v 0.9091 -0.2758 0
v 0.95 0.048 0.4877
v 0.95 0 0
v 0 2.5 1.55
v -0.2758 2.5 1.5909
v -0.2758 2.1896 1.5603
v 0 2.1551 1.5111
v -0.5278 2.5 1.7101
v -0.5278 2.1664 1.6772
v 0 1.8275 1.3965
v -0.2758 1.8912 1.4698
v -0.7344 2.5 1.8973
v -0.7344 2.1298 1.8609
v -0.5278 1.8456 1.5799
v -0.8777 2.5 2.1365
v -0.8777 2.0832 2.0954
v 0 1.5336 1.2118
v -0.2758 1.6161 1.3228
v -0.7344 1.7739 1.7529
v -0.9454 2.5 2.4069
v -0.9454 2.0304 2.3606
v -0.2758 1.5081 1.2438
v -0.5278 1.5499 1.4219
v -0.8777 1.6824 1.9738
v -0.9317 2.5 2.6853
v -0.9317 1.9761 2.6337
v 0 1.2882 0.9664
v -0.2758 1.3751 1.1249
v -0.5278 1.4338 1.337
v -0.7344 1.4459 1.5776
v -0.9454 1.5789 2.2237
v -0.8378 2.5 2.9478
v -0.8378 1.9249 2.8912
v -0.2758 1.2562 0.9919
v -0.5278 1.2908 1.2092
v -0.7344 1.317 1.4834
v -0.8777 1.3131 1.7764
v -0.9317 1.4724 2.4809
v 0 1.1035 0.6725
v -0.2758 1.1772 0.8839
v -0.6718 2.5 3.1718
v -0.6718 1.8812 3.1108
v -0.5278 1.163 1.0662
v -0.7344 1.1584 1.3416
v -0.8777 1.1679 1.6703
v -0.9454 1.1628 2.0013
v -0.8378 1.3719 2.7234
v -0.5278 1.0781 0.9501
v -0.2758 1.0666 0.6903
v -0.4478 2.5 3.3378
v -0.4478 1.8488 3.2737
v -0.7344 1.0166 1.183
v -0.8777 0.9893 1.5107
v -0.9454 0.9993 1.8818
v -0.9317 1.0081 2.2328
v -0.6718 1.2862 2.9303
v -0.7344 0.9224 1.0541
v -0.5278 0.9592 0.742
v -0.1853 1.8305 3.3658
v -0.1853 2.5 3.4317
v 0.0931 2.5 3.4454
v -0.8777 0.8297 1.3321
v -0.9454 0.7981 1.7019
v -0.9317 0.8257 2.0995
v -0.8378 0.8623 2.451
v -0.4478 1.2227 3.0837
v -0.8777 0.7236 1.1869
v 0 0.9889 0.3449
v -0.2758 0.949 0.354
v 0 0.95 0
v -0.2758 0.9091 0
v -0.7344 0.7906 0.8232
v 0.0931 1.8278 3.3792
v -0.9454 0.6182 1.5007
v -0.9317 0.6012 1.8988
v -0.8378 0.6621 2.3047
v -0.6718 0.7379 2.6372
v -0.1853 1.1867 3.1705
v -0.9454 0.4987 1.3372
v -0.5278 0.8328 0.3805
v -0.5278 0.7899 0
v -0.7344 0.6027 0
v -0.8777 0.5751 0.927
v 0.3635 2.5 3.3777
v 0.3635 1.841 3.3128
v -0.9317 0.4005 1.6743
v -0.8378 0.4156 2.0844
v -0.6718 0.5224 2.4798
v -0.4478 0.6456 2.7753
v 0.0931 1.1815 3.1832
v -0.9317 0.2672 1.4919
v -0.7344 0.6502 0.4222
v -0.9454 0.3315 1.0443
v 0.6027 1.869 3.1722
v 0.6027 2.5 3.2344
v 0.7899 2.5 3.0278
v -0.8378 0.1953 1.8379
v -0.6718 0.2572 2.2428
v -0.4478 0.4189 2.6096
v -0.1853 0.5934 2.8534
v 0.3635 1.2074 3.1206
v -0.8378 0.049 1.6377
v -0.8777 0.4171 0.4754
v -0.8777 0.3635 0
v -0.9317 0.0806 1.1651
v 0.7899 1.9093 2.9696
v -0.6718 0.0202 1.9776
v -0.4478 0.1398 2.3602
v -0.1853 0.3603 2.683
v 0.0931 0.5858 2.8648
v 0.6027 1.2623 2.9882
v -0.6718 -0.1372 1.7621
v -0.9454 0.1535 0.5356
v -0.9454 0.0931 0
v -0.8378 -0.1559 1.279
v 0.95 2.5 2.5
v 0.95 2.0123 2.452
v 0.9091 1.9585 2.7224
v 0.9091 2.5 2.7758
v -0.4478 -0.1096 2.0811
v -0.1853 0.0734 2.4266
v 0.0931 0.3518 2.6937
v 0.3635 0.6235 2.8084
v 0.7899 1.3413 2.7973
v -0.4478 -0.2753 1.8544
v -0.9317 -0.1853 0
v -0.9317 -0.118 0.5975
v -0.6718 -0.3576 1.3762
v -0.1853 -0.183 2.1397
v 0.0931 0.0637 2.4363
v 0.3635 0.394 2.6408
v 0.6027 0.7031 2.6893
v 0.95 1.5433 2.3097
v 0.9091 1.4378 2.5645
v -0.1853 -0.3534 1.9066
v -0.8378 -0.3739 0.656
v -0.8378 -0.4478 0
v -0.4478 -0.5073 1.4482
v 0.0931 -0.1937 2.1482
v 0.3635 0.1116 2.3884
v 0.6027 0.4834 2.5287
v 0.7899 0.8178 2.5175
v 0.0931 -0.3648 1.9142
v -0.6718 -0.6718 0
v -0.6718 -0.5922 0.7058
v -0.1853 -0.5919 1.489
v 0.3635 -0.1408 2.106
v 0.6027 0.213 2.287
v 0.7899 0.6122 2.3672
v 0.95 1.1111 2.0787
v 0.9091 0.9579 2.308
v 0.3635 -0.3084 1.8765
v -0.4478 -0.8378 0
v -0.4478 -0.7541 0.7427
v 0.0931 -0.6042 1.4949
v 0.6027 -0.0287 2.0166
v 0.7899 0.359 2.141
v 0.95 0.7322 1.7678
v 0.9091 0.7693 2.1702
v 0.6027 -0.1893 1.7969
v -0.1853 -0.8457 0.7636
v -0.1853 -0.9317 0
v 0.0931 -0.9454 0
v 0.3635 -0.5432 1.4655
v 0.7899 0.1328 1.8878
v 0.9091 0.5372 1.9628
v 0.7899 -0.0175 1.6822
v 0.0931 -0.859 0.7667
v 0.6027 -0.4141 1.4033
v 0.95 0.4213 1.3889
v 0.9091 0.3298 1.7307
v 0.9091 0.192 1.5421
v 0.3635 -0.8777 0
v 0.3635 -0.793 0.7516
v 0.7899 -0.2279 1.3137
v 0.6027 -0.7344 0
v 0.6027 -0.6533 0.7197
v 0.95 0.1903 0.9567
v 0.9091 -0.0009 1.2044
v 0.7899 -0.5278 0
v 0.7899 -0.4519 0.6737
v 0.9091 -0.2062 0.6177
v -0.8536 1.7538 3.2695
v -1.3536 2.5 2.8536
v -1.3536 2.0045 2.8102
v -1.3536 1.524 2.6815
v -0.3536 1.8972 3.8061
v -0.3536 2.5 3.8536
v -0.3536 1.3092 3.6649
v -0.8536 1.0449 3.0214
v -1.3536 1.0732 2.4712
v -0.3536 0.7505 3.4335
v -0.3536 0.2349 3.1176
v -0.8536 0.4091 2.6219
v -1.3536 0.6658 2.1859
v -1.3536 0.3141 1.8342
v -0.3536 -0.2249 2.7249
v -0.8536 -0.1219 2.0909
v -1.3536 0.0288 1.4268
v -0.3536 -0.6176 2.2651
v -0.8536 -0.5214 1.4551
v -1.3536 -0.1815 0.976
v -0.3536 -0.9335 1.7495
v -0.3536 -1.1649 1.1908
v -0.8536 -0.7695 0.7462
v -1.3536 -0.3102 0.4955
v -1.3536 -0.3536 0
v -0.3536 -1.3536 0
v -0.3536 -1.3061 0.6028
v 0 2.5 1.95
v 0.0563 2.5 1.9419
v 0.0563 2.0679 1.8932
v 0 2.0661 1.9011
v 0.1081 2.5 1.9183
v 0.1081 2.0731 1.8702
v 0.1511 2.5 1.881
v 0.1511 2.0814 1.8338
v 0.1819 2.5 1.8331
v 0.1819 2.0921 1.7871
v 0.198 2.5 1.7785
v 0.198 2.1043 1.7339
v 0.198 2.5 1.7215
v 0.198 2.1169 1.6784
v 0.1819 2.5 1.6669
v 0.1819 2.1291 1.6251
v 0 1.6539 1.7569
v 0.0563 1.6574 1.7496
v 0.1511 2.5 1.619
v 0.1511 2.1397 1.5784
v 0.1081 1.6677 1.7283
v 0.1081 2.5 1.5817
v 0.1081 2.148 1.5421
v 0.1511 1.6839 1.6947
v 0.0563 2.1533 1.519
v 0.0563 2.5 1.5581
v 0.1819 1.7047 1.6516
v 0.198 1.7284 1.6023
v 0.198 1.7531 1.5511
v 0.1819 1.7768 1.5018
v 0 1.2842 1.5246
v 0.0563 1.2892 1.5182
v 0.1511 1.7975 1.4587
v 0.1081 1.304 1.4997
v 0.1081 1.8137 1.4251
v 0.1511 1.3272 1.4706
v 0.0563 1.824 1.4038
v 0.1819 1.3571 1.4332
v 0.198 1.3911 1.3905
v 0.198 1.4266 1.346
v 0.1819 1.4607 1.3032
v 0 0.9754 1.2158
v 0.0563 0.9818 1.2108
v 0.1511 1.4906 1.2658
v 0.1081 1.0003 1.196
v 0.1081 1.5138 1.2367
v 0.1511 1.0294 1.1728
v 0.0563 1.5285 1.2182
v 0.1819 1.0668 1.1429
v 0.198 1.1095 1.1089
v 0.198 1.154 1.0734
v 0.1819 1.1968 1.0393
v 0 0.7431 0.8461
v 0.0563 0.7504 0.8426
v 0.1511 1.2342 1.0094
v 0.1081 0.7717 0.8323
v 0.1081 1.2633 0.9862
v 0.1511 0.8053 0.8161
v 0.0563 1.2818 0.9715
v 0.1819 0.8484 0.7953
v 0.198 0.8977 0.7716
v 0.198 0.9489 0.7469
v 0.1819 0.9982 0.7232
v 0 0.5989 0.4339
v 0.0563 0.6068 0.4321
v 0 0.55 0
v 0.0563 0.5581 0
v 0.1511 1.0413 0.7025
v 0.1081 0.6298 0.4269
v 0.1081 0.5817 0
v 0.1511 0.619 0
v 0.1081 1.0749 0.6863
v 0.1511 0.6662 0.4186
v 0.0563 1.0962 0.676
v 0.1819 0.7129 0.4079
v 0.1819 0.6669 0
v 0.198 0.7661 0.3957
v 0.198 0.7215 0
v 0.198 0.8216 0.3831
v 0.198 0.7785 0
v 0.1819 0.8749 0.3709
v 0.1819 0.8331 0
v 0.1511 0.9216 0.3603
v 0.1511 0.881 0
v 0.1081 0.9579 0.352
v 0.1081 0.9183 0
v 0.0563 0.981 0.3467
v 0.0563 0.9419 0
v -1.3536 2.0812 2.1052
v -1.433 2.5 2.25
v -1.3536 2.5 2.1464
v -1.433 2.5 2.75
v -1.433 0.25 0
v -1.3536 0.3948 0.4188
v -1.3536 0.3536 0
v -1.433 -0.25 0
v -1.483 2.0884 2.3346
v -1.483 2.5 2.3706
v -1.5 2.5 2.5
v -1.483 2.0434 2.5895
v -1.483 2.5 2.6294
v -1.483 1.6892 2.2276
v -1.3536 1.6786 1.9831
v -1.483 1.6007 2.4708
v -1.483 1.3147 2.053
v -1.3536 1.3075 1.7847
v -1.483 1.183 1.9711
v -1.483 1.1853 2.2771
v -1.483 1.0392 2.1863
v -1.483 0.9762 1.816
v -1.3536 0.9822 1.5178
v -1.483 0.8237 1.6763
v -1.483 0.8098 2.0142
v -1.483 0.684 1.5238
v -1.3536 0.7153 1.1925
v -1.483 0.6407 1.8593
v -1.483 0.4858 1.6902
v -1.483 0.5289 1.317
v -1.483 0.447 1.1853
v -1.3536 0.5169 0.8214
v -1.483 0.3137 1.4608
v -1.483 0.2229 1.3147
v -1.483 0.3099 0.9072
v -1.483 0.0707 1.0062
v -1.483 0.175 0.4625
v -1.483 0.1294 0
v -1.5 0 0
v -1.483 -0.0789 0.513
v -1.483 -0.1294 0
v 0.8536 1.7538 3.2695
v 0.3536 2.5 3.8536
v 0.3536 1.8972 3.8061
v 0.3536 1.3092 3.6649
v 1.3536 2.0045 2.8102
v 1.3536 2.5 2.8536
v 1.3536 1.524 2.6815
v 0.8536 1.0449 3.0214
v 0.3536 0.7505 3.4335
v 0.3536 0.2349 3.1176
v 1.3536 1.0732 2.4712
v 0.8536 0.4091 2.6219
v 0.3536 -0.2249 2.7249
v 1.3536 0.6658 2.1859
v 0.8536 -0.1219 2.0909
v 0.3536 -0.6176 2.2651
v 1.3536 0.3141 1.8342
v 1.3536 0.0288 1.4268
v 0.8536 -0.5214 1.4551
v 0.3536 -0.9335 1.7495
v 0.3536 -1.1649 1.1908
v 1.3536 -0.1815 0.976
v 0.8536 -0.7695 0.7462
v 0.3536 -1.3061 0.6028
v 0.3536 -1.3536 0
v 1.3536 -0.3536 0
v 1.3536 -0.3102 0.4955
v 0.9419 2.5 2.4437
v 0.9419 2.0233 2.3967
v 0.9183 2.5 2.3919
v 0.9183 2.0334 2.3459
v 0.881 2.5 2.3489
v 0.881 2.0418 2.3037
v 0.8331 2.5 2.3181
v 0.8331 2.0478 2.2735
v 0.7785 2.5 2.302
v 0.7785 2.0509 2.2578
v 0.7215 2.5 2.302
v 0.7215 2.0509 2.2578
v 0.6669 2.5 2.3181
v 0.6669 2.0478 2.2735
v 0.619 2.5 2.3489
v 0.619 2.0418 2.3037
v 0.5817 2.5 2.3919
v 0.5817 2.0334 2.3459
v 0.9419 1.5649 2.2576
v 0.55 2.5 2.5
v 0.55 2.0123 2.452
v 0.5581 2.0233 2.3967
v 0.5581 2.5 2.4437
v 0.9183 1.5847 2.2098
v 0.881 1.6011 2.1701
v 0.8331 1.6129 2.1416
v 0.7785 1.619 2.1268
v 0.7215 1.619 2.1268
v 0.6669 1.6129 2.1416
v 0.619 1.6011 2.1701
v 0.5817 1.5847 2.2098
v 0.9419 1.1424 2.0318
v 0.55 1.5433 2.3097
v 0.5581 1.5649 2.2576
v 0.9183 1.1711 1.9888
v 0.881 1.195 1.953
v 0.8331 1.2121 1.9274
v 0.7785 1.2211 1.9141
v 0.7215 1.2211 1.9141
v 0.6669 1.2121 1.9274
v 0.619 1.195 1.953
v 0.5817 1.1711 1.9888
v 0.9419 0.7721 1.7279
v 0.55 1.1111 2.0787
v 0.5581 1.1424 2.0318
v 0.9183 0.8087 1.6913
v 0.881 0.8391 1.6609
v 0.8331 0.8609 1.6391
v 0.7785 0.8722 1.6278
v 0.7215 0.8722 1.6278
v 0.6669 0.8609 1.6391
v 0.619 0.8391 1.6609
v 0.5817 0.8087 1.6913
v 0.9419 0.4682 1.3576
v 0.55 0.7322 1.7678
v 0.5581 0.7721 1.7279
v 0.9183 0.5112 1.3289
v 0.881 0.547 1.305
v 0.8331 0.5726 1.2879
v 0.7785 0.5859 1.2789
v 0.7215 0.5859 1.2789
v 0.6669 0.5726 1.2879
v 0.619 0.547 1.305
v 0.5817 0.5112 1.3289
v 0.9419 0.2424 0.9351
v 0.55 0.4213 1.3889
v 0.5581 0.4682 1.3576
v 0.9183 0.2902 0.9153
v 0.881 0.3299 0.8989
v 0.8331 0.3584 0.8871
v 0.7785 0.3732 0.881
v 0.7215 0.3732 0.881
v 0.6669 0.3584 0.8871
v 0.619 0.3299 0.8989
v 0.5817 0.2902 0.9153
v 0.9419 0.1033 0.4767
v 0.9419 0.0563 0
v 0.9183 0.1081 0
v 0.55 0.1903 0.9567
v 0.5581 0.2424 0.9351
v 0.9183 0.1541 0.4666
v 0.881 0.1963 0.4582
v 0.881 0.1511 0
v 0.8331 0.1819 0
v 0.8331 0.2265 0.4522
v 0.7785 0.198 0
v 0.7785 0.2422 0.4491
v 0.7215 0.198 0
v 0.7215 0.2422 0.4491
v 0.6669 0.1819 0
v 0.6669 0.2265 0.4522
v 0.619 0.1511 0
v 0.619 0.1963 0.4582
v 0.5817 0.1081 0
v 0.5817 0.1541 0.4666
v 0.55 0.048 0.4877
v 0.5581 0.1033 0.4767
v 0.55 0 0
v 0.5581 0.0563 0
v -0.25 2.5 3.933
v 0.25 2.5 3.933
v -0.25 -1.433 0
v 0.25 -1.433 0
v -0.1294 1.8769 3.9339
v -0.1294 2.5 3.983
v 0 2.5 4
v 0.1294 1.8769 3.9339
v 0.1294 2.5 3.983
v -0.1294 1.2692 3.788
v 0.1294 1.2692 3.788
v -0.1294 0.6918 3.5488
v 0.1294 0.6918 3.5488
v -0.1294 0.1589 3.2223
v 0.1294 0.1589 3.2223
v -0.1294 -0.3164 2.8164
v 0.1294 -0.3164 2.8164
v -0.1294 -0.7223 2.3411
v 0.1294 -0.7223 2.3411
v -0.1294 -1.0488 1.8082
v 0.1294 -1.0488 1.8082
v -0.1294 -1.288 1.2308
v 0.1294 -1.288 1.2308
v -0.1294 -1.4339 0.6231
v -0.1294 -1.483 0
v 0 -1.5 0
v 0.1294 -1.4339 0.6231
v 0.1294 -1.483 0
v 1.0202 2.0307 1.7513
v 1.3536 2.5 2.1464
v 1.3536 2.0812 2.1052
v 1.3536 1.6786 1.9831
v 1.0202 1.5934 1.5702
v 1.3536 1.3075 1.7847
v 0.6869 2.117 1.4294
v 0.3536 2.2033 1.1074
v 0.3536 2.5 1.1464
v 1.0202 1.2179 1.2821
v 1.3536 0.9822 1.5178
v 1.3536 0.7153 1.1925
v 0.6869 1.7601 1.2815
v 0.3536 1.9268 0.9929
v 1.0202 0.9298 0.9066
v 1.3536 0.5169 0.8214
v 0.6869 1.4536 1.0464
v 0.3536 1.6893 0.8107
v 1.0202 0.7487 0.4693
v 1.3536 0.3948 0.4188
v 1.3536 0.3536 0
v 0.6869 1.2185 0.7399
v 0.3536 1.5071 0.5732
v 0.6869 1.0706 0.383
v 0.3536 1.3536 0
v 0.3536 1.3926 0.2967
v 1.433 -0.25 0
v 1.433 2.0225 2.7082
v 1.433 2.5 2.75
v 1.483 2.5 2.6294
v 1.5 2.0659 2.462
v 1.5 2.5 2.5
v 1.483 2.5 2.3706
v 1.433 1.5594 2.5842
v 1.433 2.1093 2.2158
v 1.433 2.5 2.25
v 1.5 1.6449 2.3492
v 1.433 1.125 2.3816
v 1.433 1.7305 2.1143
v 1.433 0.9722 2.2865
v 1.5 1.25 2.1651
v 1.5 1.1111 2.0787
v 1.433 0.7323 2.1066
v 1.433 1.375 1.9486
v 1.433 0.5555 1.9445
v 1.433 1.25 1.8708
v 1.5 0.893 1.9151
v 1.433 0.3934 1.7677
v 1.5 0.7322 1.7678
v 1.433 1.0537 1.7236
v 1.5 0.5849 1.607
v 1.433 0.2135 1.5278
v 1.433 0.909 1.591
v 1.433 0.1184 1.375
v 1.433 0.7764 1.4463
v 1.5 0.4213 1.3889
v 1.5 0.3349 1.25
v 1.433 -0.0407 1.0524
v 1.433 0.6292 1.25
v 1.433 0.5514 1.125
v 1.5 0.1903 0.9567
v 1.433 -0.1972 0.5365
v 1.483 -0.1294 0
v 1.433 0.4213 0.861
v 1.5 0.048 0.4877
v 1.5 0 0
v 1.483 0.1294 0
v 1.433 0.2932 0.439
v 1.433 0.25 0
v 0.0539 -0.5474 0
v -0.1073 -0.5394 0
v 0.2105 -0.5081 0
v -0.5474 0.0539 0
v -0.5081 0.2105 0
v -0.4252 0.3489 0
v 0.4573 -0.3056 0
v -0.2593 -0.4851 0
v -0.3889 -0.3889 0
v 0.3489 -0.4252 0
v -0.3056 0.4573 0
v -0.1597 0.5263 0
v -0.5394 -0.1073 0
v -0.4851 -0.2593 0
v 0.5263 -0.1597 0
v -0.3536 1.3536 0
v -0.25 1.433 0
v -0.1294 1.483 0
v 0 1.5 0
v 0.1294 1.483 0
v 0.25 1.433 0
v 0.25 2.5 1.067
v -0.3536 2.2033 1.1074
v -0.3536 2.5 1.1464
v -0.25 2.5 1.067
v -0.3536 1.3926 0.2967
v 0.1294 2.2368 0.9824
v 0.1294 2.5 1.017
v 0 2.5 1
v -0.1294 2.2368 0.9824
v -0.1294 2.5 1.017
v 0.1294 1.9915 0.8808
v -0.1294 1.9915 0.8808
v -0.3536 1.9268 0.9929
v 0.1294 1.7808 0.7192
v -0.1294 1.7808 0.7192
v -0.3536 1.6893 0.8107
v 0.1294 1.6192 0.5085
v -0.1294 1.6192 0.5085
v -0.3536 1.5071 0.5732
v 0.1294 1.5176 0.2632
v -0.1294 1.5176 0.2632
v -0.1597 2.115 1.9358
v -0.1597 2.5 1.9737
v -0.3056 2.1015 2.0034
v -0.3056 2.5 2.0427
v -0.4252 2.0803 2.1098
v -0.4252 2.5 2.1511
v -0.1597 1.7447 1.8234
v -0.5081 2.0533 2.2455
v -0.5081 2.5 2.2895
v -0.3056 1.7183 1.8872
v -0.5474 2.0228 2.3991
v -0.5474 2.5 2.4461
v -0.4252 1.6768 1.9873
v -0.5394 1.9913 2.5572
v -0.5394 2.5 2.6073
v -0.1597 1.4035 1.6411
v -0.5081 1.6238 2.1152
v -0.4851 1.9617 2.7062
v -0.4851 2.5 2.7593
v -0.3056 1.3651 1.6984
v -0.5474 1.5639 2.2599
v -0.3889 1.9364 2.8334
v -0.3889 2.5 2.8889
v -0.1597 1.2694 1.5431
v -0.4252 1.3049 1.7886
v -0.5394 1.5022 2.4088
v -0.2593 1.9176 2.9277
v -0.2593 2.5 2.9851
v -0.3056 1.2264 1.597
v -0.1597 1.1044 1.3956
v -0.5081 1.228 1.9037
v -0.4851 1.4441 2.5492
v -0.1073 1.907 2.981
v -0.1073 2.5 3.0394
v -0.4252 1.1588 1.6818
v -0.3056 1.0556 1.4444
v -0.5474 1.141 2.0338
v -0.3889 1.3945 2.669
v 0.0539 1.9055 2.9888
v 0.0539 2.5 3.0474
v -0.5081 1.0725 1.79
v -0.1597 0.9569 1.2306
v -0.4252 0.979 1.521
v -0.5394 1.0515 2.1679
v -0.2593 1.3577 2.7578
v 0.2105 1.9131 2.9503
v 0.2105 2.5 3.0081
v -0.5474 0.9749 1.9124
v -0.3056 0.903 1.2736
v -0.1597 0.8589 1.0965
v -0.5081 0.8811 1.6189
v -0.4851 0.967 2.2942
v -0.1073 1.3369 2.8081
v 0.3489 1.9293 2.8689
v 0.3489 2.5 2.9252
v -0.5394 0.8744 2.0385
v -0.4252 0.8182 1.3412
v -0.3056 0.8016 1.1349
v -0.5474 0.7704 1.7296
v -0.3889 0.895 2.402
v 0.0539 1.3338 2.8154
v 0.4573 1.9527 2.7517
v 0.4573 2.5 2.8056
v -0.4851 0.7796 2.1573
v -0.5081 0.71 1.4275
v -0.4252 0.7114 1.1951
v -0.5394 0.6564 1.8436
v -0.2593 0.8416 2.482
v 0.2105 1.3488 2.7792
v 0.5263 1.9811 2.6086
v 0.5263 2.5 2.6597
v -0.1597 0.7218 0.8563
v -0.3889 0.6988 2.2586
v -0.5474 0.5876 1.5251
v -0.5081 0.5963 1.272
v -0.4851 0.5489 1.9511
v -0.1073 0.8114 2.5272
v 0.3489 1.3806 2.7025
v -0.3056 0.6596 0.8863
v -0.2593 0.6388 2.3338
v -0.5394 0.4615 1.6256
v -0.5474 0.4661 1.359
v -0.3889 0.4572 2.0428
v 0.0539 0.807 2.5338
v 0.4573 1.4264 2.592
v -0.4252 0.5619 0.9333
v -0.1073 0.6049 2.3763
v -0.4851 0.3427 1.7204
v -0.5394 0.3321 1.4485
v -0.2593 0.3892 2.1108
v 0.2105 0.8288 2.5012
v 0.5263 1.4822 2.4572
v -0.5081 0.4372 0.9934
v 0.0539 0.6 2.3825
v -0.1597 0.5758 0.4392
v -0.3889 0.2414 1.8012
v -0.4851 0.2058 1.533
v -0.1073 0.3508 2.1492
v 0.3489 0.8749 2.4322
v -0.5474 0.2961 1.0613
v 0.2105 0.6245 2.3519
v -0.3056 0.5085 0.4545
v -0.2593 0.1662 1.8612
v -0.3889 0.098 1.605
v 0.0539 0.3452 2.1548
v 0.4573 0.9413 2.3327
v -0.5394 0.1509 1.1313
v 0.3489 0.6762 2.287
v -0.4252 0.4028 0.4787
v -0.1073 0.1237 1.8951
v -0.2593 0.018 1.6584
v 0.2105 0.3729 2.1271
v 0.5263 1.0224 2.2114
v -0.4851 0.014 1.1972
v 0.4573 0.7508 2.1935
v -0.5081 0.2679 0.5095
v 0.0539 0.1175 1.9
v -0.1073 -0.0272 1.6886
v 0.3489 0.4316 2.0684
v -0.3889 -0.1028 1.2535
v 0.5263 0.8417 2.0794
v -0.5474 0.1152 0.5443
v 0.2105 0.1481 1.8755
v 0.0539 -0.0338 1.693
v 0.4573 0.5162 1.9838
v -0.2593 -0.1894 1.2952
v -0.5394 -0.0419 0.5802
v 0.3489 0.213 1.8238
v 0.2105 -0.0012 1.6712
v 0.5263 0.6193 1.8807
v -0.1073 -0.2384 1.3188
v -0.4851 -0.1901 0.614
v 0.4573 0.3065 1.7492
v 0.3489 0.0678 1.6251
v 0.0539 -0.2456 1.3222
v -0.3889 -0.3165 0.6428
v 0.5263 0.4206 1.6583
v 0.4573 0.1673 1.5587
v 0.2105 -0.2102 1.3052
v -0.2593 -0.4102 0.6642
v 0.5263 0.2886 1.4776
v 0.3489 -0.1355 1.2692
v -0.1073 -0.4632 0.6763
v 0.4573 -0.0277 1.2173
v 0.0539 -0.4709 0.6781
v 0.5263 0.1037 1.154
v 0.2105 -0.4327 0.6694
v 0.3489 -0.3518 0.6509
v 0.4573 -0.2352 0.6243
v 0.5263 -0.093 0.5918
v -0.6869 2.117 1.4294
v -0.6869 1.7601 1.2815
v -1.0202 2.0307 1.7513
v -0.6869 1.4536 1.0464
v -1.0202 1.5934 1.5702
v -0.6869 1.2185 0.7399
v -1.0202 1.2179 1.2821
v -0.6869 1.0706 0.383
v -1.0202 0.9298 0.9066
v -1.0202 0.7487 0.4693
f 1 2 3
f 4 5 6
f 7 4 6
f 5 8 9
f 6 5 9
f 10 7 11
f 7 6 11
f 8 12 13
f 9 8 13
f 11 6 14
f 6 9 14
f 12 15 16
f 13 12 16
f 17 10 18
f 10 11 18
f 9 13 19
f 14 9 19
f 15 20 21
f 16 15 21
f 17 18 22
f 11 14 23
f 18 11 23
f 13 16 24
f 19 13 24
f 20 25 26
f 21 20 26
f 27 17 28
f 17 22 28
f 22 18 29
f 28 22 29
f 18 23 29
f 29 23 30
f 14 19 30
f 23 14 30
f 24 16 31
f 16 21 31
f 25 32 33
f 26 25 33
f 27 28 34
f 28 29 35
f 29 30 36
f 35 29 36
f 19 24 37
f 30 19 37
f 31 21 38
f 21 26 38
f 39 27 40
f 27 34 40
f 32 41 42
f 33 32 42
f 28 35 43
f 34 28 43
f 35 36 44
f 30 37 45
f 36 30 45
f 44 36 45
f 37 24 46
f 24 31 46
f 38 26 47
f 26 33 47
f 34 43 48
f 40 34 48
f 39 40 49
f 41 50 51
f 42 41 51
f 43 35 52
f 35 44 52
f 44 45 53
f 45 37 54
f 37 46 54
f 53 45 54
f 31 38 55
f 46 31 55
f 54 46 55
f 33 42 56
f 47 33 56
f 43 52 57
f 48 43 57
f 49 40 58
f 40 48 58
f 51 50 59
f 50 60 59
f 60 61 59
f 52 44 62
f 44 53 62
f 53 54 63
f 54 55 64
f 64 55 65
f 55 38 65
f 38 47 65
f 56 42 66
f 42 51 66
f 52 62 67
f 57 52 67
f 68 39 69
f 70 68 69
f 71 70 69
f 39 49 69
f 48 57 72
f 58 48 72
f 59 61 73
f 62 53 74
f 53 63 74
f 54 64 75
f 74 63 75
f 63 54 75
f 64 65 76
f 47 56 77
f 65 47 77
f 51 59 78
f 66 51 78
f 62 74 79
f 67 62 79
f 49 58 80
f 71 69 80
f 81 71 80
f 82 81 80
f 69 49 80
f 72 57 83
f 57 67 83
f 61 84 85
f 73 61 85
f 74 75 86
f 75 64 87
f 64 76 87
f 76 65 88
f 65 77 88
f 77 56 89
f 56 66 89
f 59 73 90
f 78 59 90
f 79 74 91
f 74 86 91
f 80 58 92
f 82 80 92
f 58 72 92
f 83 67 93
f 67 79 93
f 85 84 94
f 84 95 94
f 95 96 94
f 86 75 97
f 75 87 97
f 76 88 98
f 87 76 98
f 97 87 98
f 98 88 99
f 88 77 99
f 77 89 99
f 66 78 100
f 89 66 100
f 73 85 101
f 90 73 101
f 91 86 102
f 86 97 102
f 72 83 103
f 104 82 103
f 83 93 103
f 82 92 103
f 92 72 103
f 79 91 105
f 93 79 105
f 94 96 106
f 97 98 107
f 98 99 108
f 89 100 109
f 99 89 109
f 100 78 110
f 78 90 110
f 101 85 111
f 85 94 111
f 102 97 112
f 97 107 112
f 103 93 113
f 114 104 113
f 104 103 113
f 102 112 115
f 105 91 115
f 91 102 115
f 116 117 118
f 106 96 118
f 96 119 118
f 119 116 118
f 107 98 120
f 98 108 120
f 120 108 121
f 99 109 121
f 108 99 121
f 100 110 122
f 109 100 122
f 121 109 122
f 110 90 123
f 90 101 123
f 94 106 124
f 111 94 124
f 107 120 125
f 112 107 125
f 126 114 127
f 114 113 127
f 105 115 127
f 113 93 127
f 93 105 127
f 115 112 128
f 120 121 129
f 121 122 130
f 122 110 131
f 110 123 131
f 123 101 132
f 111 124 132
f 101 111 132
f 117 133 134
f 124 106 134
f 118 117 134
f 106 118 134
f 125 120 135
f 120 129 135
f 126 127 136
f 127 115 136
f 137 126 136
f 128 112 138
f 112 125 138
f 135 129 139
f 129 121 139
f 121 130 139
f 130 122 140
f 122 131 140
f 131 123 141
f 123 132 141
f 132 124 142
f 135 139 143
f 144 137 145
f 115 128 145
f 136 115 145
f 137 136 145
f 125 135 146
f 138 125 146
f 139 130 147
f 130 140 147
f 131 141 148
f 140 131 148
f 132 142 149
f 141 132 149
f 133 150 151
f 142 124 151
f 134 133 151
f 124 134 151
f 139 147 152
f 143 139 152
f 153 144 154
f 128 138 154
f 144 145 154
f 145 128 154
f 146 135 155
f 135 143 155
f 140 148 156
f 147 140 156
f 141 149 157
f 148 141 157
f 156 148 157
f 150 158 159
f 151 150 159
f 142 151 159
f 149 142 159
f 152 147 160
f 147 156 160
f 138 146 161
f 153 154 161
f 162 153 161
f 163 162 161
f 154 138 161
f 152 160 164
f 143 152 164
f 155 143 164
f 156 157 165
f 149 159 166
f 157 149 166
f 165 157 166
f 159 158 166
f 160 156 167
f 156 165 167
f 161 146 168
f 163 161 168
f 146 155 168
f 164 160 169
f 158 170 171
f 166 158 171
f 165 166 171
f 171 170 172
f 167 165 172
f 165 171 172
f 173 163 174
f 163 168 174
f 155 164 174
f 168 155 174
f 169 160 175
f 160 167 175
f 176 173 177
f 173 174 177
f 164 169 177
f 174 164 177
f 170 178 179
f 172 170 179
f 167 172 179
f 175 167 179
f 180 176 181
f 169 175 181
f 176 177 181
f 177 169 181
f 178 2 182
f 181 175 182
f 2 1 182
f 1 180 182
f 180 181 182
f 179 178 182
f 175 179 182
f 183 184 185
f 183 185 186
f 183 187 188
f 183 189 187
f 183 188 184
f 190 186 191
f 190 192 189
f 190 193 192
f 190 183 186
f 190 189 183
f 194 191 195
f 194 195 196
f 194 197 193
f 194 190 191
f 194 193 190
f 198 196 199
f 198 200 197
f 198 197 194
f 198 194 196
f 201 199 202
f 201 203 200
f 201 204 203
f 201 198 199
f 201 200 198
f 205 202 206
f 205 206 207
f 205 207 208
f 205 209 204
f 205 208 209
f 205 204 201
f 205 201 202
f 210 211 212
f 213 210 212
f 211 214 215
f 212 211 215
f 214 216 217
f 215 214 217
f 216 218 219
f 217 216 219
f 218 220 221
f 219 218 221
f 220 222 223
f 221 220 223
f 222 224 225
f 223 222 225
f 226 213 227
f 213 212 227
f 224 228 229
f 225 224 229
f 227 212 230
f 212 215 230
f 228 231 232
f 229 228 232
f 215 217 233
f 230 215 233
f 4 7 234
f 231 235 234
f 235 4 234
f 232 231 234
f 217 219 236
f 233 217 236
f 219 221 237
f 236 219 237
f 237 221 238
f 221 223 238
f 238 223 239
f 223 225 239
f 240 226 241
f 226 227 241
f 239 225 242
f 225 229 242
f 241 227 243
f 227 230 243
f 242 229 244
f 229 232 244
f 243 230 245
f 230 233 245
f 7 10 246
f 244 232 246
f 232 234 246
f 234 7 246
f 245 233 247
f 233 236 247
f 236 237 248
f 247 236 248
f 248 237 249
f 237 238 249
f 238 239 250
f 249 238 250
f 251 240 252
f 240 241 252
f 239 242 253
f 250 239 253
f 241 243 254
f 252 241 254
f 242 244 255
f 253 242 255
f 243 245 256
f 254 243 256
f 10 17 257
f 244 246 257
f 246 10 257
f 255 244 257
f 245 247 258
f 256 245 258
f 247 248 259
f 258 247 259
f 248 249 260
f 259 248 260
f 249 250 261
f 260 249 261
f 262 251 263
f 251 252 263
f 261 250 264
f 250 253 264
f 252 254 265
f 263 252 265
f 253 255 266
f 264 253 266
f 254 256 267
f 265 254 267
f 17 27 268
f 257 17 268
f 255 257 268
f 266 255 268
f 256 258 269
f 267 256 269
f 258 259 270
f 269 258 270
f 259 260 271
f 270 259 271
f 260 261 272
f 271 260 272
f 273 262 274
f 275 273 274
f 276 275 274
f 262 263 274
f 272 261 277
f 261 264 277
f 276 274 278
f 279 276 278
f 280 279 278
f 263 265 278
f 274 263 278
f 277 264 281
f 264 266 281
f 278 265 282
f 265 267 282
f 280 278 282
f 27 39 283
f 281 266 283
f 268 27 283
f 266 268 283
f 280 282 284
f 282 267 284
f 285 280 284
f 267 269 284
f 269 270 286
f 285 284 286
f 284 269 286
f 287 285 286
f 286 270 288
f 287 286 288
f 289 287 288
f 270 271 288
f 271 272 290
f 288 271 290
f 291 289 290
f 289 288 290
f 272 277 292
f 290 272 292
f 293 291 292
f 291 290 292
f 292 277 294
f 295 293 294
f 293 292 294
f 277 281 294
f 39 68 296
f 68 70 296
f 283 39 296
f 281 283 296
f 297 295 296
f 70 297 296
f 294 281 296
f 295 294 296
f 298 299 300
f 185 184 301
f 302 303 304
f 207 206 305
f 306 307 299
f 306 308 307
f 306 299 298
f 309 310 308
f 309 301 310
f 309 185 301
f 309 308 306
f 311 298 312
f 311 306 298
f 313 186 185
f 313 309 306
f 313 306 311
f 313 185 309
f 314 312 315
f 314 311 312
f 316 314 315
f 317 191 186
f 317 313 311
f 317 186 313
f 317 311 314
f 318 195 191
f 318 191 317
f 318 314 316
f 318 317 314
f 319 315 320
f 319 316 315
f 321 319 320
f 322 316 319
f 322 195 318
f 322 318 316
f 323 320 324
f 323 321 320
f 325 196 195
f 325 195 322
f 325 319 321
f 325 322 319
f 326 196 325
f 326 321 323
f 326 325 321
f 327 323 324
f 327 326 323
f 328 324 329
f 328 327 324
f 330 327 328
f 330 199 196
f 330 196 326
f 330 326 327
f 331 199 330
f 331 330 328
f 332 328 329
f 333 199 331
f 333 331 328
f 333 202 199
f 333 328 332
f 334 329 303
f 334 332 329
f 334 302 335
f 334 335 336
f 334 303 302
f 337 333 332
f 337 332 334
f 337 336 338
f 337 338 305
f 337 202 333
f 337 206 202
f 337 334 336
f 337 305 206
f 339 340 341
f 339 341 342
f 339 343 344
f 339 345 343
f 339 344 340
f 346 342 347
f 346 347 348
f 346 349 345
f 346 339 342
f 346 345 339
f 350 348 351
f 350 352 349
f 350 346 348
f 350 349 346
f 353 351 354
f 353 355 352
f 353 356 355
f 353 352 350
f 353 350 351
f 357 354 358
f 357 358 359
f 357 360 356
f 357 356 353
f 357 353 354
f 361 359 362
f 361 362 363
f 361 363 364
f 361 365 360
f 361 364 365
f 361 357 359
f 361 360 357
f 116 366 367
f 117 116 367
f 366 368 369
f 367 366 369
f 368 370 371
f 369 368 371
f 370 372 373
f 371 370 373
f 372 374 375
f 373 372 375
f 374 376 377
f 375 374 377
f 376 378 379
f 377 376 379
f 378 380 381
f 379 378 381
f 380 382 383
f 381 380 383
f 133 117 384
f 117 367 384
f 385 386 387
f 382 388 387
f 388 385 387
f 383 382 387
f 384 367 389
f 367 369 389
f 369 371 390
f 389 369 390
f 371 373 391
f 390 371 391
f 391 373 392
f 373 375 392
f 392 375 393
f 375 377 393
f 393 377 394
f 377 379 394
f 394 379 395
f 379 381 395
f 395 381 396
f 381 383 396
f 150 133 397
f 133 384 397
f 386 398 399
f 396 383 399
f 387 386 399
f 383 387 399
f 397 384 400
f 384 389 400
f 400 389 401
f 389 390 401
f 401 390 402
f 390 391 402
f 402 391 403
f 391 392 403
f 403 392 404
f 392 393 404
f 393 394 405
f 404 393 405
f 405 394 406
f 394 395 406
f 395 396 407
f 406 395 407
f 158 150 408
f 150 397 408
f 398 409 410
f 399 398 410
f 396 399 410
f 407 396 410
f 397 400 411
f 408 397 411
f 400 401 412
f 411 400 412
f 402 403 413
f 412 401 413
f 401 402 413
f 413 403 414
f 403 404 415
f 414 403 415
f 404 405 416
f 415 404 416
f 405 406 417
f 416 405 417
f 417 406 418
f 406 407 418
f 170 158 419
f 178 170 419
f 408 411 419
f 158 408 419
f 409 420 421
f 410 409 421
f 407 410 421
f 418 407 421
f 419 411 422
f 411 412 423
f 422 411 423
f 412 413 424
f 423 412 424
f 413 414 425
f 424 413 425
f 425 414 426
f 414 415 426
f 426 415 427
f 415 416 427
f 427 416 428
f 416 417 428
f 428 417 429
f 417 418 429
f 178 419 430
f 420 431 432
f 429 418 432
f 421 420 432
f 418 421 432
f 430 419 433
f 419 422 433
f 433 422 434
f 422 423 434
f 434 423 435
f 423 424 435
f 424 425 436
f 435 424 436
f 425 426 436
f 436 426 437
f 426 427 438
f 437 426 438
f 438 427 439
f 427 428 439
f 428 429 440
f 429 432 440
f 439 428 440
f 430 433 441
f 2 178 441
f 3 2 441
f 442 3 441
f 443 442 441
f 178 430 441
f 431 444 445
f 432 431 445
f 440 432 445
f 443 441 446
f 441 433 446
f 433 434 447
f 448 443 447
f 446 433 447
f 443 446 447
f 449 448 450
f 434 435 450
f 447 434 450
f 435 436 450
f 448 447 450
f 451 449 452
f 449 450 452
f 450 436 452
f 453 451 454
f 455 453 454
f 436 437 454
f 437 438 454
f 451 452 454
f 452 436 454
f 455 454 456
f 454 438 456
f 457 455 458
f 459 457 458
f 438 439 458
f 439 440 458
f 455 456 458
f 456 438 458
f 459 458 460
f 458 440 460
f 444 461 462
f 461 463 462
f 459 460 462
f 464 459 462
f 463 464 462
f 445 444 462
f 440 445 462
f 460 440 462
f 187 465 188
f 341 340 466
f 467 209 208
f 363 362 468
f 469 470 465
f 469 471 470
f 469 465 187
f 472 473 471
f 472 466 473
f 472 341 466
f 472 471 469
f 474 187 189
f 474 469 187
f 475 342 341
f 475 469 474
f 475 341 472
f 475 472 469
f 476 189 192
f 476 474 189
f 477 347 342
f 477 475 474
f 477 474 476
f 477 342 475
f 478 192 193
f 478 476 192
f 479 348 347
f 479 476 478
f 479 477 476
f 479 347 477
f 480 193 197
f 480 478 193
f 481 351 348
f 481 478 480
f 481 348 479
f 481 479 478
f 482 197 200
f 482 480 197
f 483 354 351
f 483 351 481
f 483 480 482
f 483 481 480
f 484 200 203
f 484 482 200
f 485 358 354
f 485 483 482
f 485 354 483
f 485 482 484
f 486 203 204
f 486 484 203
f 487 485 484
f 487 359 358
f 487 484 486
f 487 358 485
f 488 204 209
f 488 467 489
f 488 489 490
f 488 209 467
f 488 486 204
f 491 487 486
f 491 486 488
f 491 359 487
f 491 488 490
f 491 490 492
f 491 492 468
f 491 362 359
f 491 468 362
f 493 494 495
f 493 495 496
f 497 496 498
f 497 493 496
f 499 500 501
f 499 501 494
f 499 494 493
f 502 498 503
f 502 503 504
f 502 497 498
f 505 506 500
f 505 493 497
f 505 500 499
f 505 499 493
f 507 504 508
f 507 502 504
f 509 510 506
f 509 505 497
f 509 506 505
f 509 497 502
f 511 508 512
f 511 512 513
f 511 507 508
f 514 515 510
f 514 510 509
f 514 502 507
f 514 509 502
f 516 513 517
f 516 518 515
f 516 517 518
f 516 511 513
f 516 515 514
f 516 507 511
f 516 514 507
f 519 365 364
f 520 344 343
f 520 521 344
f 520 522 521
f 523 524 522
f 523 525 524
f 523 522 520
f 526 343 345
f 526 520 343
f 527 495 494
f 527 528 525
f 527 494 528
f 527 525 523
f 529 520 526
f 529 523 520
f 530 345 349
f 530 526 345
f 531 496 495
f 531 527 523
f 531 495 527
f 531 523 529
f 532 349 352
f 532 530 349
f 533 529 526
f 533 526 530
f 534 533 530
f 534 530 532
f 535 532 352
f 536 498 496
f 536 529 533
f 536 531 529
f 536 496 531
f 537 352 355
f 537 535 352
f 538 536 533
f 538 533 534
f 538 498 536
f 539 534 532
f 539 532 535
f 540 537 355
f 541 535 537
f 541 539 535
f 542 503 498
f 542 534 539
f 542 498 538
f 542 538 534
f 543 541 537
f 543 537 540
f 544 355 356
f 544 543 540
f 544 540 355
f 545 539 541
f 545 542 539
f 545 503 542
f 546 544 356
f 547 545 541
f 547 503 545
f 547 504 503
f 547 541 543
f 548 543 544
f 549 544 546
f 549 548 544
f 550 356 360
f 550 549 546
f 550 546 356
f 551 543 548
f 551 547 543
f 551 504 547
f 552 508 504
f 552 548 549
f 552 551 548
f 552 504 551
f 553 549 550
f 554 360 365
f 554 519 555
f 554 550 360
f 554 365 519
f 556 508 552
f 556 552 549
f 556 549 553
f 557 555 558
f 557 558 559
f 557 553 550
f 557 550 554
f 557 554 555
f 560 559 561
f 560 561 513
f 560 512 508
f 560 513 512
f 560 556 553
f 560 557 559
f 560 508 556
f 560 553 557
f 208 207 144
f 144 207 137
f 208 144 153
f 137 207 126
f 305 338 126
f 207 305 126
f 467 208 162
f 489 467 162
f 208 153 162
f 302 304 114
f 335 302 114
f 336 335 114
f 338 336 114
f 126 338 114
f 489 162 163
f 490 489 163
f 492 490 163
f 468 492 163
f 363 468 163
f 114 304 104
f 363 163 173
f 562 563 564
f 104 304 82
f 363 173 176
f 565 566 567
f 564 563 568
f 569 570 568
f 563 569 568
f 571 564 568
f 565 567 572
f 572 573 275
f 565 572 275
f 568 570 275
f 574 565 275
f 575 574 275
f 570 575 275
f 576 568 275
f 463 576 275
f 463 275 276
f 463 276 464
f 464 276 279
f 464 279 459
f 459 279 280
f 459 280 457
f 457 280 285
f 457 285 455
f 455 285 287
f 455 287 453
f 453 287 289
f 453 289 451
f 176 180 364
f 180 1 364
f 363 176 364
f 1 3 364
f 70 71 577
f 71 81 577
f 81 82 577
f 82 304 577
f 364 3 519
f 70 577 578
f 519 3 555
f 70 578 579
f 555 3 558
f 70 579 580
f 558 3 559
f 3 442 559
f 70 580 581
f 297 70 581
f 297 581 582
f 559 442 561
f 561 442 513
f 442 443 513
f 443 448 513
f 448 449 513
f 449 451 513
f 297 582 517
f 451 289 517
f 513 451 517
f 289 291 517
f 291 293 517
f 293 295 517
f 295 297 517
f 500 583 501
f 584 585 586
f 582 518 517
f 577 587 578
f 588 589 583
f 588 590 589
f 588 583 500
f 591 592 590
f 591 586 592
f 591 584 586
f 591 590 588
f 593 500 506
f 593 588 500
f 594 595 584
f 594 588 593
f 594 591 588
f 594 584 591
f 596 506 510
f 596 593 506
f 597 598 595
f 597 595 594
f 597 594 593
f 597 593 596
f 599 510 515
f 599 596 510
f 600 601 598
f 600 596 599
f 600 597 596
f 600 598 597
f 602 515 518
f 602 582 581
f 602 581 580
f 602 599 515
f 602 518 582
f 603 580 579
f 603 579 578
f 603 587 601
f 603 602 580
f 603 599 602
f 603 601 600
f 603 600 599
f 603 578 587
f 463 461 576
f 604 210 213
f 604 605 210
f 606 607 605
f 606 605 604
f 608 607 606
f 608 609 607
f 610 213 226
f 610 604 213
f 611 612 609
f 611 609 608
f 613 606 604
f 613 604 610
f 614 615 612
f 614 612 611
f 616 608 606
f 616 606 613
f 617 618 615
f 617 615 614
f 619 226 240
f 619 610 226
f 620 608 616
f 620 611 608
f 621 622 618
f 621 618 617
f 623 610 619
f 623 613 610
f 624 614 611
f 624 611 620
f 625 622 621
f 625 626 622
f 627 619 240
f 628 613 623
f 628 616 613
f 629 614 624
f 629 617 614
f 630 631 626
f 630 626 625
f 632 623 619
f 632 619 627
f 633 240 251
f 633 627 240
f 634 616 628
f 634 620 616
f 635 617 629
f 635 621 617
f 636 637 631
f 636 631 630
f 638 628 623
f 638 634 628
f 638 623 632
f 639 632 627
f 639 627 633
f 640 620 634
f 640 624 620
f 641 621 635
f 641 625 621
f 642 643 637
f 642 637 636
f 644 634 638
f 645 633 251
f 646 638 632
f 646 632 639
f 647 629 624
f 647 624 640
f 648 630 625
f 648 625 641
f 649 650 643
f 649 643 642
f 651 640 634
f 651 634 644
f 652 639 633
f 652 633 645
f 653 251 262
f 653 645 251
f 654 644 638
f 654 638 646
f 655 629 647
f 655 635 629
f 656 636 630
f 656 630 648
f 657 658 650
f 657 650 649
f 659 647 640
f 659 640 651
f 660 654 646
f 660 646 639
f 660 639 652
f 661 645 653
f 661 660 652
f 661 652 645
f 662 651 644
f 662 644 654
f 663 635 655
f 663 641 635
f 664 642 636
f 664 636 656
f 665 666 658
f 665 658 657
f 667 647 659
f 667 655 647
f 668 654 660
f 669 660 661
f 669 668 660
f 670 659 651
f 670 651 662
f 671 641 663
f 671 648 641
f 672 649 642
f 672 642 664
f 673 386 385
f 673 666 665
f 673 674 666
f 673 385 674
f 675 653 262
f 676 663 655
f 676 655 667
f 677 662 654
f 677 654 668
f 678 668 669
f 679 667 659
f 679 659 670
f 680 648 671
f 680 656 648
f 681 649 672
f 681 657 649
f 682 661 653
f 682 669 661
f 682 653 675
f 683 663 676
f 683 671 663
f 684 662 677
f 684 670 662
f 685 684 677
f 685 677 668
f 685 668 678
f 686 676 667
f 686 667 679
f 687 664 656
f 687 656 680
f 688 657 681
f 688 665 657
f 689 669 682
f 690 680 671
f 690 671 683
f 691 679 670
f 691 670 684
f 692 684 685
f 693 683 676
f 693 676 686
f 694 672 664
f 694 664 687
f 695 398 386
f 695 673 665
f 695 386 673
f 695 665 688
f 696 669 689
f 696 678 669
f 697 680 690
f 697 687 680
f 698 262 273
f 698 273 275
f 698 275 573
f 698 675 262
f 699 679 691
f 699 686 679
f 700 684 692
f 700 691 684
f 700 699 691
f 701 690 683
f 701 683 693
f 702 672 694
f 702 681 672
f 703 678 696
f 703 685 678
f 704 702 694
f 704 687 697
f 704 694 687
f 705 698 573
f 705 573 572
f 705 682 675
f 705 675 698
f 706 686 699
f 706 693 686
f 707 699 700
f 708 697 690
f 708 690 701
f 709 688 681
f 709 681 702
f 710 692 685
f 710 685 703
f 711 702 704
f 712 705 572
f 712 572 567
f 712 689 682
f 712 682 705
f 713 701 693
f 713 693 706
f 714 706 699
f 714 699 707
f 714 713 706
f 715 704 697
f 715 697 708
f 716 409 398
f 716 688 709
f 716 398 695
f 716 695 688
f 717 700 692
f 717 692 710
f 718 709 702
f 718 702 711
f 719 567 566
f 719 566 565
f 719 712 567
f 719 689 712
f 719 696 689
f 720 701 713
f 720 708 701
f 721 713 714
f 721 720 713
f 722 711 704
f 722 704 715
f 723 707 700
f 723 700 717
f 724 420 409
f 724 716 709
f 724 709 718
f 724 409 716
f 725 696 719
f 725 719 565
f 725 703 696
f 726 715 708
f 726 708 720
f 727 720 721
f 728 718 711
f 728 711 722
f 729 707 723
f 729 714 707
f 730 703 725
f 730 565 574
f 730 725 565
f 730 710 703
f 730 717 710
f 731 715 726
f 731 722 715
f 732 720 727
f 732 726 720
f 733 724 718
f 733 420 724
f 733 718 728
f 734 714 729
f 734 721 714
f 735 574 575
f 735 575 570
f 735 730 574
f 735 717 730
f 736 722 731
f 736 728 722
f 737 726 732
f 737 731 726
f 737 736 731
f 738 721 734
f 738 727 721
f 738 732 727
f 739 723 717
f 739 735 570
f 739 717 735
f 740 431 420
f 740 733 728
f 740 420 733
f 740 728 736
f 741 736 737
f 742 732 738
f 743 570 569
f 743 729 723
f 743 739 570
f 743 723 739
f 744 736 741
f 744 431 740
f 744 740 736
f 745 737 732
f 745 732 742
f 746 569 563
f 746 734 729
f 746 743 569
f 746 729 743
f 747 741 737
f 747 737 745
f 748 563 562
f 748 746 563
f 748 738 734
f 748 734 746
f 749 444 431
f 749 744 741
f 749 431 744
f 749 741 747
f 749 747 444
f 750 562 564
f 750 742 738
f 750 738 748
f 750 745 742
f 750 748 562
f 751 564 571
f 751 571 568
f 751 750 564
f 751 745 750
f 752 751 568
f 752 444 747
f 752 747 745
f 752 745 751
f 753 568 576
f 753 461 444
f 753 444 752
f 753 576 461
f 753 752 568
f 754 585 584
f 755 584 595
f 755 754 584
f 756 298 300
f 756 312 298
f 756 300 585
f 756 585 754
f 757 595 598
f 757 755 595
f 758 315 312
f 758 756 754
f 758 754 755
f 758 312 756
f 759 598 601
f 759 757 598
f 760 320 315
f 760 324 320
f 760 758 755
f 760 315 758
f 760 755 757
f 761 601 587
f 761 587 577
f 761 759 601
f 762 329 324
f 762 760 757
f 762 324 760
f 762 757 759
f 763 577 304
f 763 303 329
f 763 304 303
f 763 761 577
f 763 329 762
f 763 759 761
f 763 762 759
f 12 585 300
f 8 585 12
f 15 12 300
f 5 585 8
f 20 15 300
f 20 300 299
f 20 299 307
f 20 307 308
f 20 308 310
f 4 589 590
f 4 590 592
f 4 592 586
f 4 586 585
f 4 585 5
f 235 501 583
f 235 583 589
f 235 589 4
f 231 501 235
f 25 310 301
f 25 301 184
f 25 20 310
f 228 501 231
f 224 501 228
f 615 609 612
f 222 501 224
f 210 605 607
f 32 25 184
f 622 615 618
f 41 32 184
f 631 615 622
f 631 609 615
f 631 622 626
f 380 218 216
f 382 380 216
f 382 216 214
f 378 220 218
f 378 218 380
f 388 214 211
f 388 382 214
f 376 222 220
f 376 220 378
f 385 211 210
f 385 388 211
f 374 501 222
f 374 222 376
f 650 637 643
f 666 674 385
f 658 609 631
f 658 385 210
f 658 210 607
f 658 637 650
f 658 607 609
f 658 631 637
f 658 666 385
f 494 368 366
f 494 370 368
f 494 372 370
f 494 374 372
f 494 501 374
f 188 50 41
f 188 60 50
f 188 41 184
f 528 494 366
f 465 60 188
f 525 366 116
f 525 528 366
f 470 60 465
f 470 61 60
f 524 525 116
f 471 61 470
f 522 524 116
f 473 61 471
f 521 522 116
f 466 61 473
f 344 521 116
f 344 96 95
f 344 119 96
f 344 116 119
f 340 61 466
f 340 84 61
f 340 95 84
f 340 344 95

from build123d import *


with BuildPart() as part:
    # AdditivePipe: sweep along a path in Sketch001
    with BuildLine(Plane.YZ) as additivepipe_path:
        ThreePointArc((2.499999, 2.5), (0.732233, 1.767767), (0, 0))
    # Sketch → AdditivePipe (sweep)
    with BuildSketch(Plane.XY):
        with BuildLine():
            Line((1.353553, 0.353553), (0.353553, 1.353553))
            ThreePointArc((0.353553, 1.353553), (0, 1.5), (-0.353553, 1.353553))
            Line((-0.353553, 1.353553), (-1.353553, 0.353553))
            ThreePointArc((-1.353553, 0.353553), (-1.5, 0), (-1.353553, -0.353553))
            Line((-1.353553, -0.353553), (-0.353553, -1.353553))
            ThreePointArc((-0.353553, -1.353553), (0, -1.5), (0.353553, -1.353553))
            Line((0.353553, -1.353553), (1.353553, -0.353553))
            ThreePointArc((1.353553, -0.353553), (1.5, 0), (1.353553, 0.353553))
        make_face()
        with BuildLine():
            ThreePointArc((0, 0.95), (-0.671751, -0.671751), (0.95, 0))
            ThreePointArc((0.95, 0), (0.75, 0.2), (0.55, 0))
            ThreePointArc((0, 0.55), (-0.388909, -0.388909), (0.55, 0))
            ThreePointArc((0, 0.55), (0.2, 0.75), (0, 0.95))
        make_face(mode=Mode.SUBTRACT)
    sweep(path=additivepipe_path.line)


solid = part.part
